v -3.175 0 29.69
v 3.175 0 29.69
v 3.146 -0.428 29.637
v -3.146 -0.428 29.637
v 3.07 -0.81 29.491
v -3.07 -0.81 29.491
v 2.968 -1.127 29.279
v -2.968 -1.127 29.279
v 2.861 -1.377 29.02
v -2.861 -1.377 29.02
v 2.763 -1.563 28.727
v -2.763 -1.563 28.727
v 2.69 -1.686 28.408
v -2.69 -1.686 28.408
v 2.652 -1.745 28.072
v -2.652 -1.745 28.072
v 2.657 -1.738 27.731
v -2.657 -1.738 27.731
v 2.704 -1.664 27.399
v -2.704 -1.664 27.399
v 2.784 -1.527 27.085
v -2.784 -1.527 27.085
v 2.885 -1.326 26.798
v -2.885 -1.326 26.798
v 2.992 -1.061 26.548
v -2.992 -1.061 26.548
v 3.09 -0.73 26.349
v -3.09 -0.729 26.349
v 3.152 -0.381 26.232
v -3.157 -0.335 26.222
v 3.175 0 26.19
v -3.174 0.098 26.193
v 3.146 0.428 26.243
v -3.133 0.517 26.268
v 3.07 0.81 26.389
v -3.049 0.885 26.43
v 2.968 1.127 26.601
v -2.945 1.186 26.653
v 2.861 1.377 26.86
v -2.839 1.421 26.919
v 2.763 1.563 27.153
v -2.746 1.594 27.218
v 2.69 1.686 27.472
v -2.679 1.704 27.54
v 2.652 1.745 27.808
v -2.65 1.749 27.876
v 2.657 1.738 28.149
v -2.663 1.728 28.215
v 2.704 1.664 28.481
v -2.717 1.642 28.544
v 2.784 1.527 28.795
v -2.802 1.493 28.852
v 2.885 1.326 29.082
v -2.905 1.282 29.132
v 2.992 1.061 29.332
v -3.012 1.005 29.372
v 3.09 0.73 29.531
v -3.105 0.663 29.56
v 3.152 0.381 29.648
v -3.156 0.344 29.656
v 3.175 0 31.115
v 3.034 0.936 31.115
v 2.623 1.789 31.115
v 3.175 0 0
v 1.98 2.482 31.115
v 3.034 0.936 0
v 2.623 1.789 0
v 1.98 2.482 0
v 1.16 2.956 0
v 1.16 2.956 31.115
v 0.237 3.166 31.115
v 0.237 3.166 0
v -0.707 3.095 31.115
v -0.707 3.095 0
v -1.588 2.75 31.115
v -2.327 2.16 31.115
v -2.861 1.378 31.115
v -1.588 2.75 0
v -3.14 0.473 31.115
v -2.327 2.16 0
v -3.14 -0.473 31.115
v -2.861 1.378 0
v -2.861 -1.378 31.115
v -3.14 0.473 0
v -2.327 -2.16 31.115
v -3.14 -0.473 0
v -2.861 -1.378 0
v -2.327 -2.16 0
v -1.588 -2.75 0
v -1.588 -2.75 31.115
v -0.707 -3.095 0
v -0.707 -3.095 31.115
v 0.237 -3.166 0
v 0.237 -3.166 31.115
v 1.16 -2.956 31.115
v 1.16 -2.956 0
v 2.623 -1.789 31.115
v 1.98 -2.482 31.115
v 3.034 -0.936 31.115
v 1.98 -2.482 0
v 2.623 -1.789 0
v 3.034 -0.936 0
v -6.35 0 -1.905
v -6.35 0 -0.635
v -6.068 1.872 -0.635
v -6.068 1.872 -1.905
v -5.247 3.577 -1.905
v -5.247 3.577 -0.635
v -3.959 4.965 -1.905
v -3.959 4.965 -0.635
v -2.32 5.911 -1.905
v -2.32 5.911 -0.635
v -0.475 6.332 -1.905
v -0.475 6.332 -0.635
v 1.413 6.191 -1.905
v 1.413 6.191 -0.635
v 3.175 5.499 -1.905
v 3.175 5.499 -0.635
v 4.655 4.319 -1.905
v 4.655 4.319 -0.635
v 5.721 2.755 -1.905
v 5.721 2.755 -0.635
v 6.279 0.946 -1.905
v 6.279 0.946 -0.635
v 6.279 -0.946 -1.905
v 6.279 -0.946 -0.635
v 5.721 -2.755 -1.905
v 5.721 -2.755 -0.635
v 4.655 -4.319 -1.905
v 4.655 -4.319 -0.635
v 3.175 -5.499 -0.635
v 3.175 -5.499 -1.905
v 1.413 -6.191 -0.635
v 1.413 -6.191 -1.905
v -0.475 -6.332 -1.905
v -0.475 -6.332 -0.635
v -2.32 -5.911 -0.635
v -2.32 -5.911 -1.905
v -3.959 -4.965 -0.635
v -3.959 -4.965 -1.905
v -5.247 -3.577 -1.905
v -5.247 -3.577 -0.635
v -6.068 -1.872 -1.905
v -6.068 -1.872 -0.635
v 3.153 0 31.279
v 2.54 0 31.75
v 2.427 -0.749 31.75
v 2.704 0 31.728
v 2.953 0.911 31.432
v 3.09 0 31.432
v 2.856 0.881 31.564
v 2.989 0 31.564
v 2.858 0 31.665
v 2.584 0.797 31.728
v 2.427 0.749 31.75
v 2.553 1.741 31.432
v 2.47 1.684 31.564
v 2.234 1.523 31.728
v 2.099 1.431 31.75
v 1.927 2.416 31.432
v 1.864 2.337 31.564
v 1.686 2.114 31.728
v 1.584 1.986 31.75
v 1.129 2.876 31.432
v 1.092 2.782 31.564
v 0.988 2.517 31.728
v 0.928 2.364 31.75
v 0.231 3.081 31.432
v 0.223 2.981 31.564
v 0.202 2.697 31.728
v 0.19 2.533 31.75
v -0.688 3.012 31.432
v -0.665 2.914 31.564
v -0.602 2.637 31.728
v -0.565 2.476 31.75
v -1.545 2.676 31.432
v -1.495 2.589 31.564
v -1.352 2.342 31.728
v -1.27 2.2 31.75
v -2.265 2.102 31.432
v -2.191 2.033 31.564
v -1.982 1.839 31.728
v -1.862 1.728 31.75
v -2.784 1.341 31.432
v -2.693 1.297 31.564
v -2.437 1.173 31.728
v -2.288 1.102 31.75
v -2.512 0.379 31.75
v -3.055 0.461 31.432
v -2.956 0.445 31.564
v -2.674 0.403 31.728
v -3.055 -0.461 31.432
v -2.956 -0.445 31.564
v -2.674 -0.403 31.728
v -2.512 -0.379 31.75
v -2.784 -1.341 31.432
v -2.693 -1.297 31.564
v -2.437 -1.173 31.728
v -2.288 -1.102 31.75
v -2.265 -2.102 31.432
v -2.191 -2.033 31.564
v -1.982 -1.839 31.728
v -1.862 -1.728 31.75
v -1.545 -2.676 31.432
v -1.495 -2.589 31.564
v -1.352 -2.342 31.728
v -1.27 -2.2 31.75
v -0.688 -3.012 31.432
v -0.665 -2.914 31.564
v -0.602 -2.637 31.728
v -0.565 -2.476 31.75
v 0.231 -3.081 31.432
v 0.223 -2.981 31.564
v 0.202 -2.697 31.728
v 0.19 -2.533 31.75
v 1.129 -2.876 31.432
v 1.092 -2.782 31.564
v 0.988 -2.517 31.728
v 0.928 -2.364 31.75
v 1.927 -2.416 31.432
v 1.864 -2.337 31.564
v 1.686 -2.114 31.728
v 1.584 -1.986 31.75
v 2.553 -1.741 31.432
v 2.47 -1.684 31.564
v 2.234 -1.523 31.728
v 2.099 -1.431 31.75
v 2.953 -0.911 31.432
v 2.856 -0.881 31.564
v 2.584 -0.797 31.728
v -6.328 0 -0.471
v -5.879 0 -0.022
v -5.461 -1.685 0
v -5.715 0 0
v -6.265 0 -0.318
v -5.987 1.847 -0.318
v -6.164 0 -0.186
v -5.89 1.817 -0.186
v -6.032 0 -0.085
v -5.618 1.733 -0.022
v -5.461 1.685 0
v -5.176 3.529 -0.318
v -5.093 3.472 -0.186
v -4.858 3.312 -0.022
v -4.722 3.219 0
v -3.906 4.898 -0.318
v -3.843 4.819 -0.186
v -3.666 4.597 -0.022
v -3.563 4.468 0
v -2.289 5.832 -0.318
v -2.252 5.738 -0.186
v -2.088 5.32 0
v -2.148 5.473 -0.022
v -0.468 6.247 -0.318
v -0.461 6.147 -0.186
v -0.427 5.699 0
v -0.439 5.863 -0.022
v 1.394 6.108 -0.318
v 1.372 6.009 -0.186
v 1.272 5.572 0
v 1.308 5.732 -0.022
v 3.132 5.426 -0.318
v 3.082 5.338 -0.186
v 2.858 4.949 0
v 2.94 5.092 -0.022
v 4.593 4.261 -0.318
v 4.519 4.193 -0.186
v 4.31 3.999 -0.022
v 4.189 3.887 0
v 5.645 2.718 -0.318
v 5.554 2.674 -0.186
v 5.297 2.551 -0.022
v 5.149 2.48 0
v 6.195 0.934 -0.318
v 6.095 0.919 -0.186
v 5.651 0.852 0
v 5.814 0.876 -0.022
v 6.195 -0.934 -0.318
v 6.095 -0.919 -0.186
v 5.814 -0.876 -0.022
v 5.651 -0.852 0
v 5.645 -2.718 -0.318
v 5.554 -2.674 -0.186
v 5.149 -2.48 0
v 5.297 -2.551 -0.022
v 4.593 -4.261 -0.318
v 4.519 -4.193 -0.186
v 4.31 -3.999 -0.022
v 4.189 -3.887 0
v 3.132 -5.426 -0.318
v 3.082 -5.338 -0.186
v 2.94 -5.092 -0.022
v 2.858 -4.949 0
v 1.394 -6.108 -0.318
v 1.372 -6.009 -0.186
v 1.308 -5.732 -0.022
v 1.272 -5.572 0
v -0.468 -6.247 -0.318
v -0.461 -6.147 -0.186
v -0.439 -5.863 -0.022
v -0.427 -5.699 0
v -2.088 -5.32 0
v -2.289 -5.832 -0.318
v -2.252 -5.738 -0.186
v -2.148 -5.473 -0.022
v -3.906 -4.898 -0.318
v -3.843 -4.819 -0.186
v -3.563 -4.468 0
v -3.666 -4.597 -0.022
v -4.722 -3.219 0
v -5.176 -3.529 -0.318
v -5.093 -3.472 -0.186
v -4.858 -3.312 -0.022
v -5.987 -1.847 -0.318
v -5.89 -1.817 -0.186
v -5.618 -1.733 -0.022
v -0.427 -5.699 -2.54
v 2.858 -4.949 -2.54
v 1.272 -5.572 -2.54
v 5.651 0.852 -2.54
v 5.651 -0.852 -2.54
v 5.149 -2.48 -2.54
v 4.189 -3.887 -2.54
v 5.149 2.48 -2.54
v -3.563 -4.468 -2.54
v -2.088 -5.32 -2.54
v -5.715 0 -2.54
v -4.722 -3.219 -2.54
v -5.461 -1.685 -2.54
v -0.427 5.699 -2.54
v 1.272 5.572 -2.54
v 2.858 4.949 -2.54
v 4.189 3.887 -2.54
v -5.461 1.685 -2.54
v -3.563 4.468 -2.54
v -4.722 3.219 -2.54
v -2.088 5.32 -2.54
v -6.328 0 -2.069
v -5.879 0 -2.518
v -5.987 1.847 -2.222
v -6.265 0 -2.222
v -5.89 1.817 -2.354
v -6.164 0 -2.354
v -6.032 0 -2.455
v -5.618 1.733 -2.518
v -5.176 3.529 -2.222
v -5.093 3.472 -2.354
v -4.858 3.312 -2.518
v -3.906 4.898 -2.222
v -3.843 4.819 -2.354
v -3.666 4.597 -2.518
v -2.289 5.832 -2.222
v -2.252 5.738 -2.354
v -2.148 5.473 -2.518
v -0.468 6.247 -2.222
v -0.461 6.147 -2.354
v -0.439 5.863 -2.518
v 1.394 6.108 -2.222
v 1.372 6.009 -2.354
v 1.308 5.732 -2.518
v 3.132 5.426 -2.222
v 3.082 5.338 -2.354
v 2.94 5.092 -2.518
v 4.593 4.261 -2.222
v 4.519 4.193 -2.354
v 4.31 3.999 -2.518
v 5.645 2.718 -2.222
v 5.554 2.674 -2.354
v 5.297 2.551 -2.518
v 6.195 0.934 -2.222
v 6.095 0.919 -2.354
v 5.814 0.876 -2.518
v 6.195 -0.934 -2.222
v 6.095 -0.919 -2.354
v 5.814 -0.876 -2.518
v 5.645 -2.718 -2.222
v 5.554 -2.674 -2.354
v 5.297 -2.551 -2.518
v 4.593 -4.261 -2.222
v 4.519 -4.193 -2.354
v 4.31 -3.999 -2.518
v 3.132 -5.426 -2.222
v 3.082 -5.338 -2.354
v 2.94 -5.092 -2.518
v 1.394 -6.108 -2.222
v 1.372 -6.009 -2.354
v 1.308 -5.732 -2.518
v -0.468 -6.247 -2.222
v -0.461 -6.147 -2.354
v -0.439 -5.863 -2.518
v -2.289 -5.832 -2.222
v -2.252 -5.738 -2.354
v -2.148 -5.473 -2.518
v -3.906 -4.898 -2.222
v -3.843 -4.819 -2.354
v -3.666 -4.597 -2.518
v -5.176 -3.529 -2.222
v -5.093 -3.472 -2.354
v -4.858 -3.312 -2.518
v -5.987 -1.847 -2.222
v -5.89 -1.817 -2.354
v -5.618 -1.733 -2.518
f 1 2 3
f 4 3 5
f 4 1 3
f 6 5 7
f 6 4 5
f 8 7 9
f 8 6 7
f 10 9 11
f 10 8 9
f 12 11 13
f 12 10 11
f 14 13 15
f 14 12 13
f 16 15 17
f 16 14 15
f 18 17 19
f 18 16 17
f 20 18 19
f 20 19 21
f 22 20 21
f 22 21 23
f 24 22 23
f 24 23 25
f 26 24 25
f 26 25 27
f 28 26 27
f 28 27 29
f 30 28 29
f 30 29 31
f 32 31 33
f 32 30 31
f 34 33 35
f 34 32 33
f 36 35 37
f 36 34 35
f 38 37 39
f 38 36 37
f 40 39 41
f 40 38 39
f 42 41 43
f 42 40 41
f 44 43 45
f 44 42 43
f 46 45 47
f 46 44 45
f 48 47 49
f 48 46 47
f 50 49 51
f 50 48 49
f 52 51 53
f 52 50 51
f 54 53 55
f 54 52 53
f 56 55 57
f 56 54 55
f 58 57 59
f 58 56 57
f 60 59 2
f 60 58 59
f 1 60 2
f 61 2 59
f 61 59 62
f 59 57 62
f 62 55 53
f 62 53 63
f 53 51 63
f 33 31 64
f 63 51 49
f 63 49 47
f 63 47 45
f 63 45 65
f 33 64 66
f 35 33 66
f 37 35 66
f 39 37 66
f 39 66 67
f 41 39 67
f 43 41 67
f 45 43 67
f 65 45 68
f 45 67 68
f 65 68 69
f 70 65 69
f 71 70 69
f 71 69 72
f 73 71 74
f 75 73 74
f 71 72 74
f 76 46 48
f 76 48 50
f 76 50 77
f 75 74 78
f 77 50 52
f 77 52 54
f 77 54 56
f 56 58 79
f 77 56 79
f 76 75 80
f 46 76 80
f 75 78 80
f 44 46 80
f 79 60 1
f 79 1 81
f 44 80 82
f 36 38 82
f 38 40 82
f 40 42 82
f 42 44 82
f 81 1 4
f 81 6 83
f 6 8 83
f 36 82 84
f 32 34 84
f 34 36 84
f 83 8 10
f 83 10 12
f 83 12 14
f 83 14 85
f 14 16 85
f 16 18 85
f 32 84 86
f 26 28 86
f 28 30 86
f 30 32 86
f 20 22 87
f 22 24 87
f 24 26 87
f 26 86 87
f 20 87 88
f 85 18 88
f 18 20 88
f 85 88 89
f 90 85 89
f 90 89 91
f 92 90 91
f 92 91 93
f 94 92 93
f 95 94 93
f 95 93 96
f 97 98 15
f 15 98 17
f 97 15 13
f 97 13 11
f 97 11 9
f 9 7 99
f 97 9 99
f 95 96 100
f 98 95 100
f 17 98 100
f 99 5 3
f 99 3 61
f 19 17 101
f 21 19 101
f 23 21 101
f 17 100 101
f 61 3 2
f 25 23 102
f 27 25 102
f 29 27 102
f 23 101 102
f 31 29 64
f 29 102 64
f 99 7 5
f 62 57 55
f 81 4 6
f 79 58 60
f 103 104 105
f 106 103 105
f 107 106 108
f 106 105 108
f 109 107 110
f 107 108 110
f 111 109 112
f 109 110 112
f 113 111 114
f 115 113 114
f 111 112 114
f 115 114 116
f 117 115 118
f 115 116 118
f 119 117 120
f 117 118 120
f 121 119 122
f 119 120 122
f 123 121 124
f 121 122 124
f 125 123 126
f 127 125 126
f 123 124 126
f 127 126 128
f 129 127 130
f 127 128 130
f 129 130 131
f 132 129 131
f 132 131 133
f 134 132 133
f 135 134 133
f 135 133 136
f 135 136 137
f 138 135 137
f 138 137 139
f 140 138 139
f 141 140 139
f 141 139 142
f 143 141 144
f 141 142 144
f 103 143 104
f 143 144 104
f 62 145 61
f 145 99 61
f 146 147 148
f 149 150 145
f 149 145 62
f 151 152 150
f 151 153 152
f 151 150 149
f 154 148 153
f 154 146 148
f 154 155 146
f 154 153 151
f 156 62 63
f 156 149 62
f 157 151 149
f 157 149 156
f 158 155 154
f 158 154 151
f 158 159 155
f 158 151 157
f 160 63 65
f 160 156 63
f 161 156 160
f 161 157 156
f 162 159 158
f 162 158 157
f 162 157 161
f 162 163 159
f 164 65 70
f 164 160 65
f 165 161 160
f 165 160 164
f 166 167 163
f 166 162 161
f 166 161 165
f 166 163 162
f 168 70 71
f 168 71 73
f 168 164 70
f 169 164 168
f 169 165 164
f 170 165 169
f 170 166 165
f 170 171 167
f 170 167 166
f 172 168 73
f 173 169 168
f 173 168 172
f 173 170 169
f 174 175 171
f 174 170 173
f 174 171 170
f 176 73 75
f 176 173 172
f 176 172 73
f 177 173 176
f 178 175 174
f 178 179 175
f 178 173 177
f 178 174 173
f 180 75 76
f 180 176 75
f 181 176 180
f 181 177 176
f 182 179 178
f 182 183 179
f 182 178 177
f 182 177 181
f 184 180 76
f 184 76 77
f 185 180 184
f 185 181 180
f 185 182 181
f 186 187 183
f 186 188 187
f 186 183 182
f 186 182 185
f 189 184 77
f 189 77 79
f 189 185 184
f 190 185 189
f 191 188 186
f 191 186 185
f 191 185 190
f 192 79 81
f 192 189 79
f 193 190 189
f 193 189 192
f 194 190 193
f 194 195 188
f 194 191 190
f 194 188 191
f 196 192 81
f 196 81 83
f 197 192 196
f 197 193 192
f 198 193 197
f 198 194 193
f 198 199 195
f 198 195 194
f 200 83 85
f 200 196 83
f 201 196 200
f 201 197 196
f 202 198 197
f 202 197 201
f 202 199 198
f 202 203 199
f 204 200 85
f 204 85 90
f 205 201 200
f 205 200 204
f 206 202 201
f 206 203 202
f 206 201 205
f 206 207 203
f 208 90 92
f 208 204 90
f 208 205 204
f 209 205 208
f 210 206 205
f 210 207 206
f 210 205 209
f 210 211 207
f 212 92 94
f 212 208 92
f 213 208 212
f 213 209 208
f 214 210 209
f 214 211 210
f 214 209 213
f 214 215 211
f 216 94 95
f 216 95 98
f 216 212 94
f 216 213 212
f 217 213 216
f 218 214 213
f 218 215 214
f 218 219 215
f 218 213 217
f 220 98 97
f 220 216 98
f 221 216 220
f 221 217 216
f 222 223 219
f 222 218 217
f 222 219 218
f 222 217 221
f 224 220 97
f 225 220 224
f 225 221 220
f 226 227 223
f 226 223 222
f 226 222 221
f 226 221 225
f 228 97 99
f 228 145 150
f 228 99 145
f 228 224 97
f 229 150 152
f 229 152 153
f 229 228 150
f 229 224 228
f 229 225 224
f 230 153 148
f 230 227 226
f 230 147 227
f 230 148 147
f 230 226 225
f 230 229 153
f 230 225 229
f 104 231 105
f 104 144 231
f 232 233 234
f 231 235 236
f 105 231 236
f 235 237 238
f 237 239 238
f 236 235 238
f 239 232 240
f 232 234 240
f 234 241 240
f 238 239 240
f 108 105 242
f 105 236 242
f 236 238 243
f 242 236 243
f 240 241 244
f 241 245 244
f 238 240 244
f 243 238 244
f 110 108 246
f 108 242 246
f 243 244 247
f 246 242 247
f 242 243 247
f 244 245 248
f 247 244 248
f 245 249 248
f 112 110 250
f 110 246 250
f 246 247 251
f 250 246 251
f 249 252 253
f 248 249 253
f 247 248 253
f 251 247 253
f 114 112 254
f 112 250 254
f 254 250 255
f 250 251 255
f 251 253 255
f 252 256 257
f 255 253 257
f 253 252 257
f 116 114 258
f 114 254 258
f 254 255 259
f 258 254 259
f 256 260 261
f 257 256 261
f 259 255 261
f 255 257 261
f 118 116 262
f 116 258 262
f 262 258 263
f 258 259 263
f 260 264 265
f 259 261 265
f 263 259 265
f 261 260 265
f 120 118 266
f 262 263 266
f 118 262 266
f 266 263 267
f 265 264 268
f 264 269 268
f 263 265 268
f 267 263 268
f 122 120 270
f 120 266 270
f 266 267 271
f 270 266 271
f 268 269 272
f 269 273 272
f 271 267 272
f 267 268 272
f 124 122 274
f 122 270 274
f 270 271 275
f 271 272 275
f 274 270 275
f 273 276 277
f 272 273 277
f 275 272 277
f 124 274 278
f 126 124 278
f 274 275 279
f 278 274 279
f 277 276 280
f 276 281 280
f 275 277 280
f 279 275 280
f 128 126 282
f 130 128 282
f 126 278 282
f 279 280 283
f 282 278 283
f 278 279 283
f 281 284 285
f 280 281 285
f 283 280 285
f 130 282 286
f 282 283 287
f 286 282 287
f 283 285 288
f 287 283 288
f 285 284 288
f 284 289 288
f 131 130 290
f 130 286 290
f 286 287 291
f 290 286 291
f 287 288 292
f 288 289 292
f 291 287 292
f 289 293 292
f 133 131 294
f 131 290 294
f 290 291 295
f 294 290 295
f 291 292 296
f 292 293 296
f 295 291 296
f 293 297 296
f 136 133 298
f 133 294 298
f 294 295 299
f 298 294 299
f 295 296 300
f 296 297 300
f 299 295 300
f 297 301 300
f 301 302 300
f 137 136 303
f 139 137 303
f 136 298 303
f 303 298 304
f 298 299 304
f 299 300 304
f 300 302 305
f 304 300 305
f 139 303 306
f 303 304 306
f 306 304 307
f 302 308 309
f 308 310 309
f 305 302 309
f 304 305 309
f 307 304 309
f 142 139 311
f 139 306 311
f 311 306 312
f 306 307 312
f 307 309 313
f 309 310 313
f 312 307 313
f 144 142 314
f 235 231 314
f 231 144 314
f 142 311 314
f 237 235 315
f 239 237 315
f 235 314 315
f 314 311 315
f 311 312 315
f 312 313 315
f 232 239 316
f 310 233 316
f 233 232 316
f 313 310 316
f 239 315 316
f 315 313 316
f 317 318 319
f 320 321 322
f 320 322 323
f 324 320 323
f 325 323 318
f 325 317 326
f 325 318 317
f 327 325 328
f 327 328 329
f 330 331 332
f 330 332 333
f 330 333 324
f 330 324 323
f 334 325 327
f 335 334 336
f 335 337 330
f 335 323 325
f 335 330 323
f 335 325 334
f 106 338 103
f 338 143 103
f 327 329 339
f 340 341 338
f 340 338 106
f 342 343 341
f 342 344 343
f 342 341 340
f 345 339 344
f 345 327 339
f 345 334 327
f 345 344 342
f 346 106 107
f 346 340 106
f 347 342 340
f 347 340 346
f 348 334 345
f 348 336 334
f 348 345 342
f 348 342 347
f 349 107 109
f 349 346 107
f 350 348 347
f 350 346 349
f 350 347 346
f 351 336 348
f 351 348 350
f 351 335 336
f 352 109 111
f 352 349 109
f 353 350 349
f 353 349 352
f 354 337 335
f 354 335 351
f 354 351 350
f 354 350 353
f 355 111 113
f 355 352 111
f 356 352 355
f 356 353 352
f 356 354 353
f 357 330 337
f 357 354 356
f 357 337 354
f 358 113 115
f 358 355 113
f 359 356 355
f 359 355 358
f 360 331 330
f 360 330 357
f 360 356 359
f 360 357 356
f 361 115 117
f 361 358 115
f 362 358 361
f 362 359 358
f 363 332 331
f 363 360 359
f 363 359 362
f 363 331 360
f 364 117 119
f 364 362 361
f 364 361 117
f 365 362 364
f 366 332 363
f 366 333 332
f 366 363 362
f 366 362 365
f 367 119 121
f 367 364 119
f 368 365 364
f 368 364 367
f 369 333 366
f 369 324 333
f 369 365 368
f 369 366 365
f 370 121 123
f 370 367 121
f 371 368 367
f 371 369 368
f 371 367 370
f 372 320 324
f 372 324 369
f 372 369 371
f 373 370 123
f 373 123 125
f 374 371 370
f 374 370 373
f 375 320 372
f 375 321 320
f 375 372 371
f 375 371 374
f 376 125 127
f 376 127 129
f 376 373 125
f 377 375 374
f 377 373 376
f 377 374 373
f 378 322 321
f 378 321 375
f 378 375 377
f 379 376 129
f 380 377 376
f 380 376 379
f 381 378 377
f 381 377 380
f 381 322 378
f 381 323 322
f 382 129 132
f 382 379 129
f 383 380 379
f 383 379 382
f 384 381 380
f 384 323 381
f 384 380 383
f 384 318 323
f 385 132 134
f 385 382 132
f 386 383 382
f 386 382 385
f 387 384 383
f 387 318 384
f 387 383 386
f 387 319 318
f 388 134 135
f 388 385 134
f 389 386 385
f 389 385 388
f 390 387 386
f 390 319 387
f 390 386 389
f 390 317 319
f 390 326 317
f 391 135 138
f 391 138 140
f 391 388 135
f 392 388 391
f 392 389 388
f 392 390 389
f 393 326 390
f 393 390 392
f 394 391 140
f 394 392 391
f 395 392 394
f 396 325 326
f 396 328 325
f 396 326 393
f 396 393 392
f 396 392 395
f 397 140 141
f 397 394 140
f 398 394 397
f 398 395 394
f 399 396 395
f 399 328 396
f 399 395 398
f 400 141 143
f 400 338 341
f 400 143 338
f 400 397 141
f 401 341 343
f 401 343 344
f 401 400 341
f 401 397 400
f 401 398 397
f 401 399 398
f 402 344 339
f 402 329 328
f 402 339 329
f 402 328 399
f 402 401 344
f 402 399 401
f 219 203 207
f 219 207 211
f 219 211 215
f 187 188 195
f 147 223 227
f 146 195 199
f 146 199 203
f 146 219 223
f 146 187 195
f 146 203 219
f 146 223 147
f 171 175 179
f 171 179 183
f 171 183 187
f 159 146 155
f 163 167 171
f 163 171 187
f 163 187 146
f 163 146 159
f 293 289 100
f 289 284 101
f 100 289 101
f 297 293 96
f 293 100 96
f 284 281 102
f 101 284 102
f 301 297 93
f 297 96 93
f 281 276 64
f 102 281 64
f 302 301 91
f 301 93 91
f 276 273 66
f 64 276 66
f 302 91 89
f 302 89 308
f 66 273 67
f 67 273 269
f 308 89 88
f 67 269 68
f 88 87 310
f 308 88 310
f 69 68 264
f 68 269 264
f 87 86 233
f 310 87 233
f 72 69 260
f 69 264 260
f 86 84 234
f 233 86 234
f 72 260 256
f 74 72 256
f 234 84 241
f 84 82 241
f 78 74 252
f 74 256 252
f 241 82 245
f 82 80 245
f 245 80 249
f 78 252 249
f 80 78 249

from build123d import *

# Parameters (mm, degrees)
SKETCH1_R               = 3.175
BOSS_EXTRUDE1_DEPTH     = 31.75
SKETCH2_R               = 6.35
BOSS_EXTRUDE2_DEPTH     = 2.54
CUT_EXTRUDE1_DEPTH      = 33.995567884
CUT_EXTRUDE1_DEPTH_BACK = 33.995567884
SKETCH3_R               = 1.75
FILLET2_R               = 0.635


with BuildPart() as part:
    # Sketch1 → Boss-Extrude1 (new body)
    with BuildSketch(Plane.XY):
        Circle(SKETCH1_R)
    extrude(amount=BOSS_EXTRUDE1_DEPTH)

    # Sketch2 → Boss-Extrude2 (add)
    with BuildSketch(Plane(origin=(0, 0, 0), x_dir=(-1, 0, 0), z_dir=(0, 0, -1))):
        Circle(SKETCH2_R)
    extrude(amount=BOSS_EXTRUDE2_DEPTH)

    # Sketch3 → Cut-Extrude1 (cut, two sides: drawn at the far end of the back side and taken through both)
    with BuildSketch(Plane(origin=(0, 0, 0), x_dir=(0, 0, -1), z_dir=(1, 0, 0)).offset(-CUT_EXTRUDE1_DEPTH_BACK)):
        with Locations(Location((-27.94, 0, 0), (0, 0, 180.000000003))):
            Circle(SKETCH3_R)
    extrude(amount=CUT_EXTRUDE1_DEPTH + CUT_EXTRUDE1_DEPTH_BACK, mode=Mode.SUBTRACT)

    # Fillet2
    fillet2_edges = [part.edges().sort_by_distance(p)[0] for p in [
        (-3.175, 0, 31.75),
        (6.35, 0, 0),
        (6.35, 0, -2.54),
    ]]
    fillet(fillet2_edges, radius=FILLET2_R)


solid = part.part
